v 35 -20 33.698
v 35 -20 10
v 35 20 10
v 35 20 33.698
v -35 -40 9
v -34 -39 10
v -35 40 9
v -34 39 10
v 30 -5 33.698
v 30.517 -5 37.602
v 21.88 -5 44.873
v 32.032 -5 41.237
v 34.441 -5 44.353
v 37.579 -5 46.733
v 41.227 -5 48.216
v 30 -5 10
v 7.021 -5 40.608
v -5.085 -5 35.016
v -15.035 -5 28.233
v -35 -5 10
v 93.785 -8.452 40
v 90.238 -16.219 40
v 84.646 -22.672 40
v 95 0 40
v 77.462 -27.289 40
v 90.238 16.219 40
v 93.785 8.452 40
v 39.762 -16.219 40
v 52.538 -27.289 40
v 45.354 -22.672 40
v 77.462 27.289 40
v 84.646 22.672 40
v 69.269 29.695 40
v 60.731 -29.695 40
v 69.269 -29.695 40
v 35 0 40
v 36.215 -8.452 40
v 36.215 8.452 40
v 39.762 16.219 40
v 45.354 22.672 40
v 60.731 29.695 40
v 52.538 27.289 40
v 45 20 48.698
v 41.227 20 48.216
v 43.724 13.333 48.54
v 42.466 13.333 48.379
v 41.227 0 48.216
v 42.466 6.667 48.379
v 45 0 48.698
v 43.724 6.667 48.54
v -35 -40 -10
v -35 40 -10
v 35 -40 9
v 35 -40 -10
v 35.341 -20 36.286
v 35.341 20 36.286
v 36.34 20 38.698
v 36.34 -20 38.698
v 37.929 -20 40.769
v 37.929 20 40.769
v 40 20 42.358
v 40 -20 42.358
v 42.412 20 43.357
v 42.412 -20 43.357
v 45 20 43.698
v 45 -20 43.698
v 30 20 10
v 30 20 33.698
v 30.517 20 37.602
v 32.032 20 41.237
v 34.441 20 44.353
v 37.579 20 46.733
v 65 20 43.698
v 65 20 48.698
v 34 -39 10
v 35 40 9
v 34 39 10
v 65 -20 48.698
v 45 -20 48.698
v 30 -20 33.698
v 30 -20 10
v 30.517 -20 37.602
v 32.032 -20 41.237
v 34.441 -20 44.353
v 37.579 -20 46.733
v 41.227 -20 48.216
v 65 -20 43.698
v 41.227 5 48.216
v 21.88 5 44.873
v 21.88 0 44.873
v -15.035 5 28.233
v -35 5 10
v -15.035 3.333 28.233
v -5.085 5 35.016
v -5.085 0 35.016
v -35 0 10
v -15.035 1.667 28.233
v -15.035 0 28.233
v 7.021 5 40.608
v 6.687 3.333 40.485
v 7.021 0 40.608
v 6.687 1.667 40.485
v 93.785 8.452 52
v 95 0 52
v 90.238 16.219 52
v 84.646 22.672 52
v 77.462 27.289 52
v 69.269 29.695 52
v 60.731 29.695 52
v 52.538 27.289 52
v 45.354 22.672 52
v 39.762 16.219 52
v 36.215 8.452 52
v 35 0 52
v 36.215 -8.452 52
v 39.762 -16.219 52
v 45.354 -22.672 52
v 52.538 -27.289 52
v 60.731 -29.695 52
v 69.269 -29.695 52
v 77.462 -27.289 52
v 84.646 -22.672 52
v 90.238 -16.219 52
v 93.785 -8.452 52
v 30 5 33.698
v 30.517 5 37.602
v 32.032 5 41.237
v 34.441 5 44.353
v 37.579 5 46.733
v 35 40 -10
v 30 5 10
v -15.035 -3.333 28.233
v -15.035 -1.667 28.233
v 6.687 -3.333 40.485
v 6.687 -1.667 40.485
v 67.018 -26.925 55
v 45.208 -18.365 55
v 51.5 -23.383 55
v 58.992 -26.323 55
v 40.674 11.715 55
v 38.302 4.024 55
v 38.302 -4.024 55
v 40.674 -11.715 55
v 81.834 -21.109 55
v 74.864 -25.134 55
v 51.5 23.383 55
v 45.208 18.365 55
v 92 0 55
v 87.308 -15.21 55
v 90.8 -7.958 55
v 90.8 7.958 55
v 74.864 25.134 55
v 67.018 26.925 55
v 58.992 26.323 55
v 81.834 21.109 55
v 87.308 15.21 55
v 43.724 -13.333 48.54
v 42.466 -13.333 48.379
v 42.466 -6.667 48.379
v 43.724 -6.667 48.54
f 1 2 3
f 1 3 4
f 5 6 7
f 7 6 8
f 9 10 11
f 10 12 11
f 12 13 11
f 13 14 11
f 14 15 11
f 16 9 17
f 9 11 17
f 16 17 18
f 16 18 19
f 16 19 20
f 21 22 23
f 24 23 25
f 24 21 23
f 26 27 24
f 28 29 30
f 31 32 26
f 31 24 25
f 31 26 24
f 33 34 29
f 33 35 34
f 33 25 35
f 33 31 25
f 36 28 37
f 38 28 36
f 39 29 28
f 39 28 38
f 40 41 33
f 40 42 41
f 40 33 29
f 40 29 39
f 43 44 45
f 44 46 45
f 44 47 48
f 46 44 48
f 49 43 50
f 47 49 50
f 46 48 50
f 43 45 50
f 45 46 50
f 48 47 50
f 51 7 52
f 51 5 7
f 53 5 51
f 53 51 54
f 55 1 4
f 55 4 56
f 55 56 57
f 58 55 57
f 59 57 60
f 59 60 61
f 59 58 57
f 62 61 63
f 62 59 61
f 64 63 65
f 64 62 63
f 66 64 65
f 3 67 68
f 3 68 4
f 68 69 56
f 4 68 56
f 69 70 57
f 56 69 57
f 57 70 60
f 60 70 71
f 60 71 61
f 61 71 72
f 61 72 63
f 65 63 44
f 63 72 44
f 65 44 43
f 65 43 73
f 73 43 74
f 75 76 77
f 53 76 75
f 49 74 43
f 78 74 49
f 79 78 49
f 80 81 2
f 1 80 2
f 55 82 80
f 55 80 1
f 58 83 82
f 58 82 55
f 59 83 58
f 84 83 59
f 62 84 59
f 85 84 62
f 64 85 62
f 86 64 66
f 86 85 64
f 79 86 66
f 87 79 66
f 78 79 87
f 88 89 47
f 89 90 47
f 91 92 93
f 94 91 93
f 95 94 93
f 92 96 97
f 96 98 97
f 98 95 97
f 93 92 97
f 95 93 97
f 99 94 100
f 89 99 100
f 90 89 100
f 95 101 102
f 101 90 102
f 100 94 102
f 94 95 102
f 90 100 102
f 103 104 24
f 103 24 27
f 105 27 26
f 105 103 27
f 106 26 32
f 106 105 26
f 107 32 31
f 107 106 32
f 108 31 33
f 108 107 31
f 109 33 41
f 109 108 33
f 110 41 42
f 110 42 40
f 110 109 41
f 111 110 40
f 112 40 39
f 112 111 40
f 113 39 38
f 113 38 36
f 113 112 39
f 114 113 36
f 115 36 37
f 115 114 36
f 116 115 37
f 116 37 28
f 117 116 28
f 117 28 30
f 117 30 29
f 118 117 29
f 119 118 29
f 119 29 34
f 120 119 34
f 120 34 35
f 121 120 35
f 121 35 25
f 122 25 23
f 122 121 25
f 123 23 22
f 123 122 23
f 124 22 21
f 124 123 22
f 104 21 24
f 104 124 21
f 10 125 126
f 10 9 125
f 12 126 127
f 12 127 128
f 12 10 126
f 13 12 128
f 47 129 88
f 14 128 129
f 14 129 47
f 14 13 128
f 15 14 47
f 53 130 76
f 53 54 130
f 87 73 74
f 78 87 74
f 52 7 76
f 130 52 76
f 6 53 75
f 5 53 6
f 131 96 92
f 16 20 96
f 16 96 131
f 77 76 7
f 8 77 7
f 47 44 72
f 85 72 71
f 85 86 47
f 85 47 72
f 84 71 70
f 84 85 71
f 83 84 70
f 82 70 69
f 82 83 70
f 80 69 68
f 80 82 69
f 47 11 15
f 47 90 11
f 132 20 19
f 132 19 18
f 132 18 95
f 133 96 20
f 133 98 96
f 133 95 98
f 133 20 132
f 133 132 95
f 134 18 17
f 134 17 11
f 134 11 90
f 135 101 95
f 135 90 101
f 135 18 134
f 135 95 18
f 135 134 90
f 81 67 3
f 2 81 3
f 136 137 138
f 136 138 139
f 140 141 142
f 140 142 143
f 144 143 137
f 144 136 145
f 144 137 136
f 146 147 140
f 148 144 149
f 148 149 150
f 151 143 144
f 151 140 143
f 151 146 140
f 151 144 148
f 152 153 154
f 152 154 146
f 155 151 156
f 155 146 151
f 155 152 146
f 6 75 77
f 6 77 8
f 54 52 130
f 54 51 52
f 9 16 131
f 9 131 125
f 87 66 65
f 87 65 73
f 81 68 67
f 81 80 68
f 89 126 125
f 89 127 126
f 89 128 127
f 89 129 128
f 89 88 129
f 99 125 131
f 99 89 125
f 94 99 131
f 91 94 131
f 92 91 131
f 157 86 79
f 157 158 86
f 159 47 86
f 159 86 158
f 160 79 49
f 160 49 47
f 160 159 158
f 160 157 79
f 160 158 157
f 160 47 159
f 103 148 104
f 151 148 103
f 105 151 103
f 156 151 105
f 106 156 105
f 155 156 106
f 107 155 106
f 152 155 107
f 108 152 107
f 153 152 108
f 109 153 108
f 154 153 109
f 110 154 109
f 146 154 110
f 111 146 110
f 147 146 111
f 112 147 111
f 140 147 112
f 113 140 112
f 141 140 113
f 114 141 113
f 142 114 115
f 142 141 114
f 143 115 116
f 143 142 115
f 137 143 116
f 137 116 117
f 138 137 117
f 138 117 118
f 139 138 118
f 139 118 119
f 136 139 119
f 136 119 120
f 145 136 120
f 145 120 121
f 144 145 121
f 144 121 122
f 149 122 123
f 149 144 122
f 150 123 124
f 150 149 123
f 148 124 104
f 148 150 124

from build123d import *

# Parameters (mm, degrees)
F1_DEPTH = 40
F0_W     = 10
F0_H     = 5
F2_DEPTH = 20
F3_DEPTH = 5
F5_SIZE  = 1
F6_SIZE  = 3
F7_R     = 15.6062150544
F8_DEPTH = 82.8


with BuildPart() as f1:
    # F0 (on Front) → F1 (new body, symmetric)
    with BuildSketch(Plane.XZ):
        Polygon((-35, -10), (35, -10), (35, 10), (30, 10), (-35, 10), align=None)
    extrude(amount=F1_DEPTH, both=True)

    # F5
    f5_edges = [f1.edges().sort_by_distance(p)[0] for p in [
        (-35, 0, 10),
        (0, -40, 10),
        (35, 0, 10),
        (0, 40, 10),
    ]]
    chamfer(f5_edges, length=F5_SIZE)

    # F7 (on Top) → F8 (cut)
    with BuildSketch(Plane.XY):
        with Locations((64.8903474212, 0)):
            Circle(F7_R)
    extrude(amount=-F8_DEPTH, mode=Mode.SUBTRACT)


with BuildPart() as f2:
    # F0 (on Front) → F2 (new body, symmetric)
    with BuildSketch(Plane.XZ):
        with BuildLine():
            Line((30, 10), (35, 10))
            Line((35, 10), (35, 33.6980518011))
            ThreePointArc((35, 33.6980518011), (37.9289321881, 40.769119613), (45, 43.6980518011))
            Line((45, 43.6980518011), (55, 43.6980518011))
            Line((55, 43.6980518011), (55, 48.6980518011))
            Line((55, 48.6980518011), (45, 48.6980518011))
            add(Edge.make_bspline(
                [(41.2270816212, 48.2158025534), (42.4571708207, 48.3799907814), (43.7144630307, 48.5406946478), (45, 48.6980518011)],
                knots=[86.4847858943, 86.4847858943, 86.4847858943, 86.4847858943, 88.8681000877, 88.8681000877, 88.8681000877, 88.8681000877], degree=3))
            ThreePointArc((41.2270816212, 48.2158025534), (33.1342135599, 42.8742771775), (30, 33.6980518011))
            Line((30, 33.6980518011), (30, 10))
        make_face()
        with Locations((60, 46.1980518011)):
            Rectangle(F0_W, F0_H)
    extrude(amount=F2_DEPTH, both=True)


with BuildPart() as f3:
    # F0 (on Front) → F3 (new body, symmetric)
    with BuildSketch(Plane.XZ):
        with BuildLine():
            add(Edge.make_bspline(
                [(-35, 10), (-12.2262453231, 31.711628752), (-3.4099206471, 42.2578034865), (41.2270816212, 48.2158025534)],
                knots=[0, 0, 0, 0, 86.4847858943, 86.4847858943, 86.4847858943, 86.4847858943], degree=3))
            Line((-35, 10), (30, 10))
            Line((30, 10), (30, 33.6980518011))
            ThreePointArc((30, 33.6980518011), (33.1342135599, 42.8742771775), (41.2270816212, 48.2158025534))
        make_face()
    extrude(amount=F3_DEPTH, both=True)


with BuildPart() as f4:
    # F0 (on Front) → F4 (revolve)
    with BuildSketch(Plane.XZ):
        Polygon((65, 48.6980518011), (65, 43.6980518011), (65, 40), (95, 40), (95, 55), (65, 55), align=None)
    revolve(axis=Axis((65, 0, 47.5), (0, 0, 1)))

    # F6
    f6_edges = [f4.edges().sort_by_distance(p)[0] for p in [
        (35, 0, 55),
    ]]
    chamfer(f6_edges, length=F6_SIZE)


solid = Compound([f1.part, f2.part, f3.part, f4.part])
